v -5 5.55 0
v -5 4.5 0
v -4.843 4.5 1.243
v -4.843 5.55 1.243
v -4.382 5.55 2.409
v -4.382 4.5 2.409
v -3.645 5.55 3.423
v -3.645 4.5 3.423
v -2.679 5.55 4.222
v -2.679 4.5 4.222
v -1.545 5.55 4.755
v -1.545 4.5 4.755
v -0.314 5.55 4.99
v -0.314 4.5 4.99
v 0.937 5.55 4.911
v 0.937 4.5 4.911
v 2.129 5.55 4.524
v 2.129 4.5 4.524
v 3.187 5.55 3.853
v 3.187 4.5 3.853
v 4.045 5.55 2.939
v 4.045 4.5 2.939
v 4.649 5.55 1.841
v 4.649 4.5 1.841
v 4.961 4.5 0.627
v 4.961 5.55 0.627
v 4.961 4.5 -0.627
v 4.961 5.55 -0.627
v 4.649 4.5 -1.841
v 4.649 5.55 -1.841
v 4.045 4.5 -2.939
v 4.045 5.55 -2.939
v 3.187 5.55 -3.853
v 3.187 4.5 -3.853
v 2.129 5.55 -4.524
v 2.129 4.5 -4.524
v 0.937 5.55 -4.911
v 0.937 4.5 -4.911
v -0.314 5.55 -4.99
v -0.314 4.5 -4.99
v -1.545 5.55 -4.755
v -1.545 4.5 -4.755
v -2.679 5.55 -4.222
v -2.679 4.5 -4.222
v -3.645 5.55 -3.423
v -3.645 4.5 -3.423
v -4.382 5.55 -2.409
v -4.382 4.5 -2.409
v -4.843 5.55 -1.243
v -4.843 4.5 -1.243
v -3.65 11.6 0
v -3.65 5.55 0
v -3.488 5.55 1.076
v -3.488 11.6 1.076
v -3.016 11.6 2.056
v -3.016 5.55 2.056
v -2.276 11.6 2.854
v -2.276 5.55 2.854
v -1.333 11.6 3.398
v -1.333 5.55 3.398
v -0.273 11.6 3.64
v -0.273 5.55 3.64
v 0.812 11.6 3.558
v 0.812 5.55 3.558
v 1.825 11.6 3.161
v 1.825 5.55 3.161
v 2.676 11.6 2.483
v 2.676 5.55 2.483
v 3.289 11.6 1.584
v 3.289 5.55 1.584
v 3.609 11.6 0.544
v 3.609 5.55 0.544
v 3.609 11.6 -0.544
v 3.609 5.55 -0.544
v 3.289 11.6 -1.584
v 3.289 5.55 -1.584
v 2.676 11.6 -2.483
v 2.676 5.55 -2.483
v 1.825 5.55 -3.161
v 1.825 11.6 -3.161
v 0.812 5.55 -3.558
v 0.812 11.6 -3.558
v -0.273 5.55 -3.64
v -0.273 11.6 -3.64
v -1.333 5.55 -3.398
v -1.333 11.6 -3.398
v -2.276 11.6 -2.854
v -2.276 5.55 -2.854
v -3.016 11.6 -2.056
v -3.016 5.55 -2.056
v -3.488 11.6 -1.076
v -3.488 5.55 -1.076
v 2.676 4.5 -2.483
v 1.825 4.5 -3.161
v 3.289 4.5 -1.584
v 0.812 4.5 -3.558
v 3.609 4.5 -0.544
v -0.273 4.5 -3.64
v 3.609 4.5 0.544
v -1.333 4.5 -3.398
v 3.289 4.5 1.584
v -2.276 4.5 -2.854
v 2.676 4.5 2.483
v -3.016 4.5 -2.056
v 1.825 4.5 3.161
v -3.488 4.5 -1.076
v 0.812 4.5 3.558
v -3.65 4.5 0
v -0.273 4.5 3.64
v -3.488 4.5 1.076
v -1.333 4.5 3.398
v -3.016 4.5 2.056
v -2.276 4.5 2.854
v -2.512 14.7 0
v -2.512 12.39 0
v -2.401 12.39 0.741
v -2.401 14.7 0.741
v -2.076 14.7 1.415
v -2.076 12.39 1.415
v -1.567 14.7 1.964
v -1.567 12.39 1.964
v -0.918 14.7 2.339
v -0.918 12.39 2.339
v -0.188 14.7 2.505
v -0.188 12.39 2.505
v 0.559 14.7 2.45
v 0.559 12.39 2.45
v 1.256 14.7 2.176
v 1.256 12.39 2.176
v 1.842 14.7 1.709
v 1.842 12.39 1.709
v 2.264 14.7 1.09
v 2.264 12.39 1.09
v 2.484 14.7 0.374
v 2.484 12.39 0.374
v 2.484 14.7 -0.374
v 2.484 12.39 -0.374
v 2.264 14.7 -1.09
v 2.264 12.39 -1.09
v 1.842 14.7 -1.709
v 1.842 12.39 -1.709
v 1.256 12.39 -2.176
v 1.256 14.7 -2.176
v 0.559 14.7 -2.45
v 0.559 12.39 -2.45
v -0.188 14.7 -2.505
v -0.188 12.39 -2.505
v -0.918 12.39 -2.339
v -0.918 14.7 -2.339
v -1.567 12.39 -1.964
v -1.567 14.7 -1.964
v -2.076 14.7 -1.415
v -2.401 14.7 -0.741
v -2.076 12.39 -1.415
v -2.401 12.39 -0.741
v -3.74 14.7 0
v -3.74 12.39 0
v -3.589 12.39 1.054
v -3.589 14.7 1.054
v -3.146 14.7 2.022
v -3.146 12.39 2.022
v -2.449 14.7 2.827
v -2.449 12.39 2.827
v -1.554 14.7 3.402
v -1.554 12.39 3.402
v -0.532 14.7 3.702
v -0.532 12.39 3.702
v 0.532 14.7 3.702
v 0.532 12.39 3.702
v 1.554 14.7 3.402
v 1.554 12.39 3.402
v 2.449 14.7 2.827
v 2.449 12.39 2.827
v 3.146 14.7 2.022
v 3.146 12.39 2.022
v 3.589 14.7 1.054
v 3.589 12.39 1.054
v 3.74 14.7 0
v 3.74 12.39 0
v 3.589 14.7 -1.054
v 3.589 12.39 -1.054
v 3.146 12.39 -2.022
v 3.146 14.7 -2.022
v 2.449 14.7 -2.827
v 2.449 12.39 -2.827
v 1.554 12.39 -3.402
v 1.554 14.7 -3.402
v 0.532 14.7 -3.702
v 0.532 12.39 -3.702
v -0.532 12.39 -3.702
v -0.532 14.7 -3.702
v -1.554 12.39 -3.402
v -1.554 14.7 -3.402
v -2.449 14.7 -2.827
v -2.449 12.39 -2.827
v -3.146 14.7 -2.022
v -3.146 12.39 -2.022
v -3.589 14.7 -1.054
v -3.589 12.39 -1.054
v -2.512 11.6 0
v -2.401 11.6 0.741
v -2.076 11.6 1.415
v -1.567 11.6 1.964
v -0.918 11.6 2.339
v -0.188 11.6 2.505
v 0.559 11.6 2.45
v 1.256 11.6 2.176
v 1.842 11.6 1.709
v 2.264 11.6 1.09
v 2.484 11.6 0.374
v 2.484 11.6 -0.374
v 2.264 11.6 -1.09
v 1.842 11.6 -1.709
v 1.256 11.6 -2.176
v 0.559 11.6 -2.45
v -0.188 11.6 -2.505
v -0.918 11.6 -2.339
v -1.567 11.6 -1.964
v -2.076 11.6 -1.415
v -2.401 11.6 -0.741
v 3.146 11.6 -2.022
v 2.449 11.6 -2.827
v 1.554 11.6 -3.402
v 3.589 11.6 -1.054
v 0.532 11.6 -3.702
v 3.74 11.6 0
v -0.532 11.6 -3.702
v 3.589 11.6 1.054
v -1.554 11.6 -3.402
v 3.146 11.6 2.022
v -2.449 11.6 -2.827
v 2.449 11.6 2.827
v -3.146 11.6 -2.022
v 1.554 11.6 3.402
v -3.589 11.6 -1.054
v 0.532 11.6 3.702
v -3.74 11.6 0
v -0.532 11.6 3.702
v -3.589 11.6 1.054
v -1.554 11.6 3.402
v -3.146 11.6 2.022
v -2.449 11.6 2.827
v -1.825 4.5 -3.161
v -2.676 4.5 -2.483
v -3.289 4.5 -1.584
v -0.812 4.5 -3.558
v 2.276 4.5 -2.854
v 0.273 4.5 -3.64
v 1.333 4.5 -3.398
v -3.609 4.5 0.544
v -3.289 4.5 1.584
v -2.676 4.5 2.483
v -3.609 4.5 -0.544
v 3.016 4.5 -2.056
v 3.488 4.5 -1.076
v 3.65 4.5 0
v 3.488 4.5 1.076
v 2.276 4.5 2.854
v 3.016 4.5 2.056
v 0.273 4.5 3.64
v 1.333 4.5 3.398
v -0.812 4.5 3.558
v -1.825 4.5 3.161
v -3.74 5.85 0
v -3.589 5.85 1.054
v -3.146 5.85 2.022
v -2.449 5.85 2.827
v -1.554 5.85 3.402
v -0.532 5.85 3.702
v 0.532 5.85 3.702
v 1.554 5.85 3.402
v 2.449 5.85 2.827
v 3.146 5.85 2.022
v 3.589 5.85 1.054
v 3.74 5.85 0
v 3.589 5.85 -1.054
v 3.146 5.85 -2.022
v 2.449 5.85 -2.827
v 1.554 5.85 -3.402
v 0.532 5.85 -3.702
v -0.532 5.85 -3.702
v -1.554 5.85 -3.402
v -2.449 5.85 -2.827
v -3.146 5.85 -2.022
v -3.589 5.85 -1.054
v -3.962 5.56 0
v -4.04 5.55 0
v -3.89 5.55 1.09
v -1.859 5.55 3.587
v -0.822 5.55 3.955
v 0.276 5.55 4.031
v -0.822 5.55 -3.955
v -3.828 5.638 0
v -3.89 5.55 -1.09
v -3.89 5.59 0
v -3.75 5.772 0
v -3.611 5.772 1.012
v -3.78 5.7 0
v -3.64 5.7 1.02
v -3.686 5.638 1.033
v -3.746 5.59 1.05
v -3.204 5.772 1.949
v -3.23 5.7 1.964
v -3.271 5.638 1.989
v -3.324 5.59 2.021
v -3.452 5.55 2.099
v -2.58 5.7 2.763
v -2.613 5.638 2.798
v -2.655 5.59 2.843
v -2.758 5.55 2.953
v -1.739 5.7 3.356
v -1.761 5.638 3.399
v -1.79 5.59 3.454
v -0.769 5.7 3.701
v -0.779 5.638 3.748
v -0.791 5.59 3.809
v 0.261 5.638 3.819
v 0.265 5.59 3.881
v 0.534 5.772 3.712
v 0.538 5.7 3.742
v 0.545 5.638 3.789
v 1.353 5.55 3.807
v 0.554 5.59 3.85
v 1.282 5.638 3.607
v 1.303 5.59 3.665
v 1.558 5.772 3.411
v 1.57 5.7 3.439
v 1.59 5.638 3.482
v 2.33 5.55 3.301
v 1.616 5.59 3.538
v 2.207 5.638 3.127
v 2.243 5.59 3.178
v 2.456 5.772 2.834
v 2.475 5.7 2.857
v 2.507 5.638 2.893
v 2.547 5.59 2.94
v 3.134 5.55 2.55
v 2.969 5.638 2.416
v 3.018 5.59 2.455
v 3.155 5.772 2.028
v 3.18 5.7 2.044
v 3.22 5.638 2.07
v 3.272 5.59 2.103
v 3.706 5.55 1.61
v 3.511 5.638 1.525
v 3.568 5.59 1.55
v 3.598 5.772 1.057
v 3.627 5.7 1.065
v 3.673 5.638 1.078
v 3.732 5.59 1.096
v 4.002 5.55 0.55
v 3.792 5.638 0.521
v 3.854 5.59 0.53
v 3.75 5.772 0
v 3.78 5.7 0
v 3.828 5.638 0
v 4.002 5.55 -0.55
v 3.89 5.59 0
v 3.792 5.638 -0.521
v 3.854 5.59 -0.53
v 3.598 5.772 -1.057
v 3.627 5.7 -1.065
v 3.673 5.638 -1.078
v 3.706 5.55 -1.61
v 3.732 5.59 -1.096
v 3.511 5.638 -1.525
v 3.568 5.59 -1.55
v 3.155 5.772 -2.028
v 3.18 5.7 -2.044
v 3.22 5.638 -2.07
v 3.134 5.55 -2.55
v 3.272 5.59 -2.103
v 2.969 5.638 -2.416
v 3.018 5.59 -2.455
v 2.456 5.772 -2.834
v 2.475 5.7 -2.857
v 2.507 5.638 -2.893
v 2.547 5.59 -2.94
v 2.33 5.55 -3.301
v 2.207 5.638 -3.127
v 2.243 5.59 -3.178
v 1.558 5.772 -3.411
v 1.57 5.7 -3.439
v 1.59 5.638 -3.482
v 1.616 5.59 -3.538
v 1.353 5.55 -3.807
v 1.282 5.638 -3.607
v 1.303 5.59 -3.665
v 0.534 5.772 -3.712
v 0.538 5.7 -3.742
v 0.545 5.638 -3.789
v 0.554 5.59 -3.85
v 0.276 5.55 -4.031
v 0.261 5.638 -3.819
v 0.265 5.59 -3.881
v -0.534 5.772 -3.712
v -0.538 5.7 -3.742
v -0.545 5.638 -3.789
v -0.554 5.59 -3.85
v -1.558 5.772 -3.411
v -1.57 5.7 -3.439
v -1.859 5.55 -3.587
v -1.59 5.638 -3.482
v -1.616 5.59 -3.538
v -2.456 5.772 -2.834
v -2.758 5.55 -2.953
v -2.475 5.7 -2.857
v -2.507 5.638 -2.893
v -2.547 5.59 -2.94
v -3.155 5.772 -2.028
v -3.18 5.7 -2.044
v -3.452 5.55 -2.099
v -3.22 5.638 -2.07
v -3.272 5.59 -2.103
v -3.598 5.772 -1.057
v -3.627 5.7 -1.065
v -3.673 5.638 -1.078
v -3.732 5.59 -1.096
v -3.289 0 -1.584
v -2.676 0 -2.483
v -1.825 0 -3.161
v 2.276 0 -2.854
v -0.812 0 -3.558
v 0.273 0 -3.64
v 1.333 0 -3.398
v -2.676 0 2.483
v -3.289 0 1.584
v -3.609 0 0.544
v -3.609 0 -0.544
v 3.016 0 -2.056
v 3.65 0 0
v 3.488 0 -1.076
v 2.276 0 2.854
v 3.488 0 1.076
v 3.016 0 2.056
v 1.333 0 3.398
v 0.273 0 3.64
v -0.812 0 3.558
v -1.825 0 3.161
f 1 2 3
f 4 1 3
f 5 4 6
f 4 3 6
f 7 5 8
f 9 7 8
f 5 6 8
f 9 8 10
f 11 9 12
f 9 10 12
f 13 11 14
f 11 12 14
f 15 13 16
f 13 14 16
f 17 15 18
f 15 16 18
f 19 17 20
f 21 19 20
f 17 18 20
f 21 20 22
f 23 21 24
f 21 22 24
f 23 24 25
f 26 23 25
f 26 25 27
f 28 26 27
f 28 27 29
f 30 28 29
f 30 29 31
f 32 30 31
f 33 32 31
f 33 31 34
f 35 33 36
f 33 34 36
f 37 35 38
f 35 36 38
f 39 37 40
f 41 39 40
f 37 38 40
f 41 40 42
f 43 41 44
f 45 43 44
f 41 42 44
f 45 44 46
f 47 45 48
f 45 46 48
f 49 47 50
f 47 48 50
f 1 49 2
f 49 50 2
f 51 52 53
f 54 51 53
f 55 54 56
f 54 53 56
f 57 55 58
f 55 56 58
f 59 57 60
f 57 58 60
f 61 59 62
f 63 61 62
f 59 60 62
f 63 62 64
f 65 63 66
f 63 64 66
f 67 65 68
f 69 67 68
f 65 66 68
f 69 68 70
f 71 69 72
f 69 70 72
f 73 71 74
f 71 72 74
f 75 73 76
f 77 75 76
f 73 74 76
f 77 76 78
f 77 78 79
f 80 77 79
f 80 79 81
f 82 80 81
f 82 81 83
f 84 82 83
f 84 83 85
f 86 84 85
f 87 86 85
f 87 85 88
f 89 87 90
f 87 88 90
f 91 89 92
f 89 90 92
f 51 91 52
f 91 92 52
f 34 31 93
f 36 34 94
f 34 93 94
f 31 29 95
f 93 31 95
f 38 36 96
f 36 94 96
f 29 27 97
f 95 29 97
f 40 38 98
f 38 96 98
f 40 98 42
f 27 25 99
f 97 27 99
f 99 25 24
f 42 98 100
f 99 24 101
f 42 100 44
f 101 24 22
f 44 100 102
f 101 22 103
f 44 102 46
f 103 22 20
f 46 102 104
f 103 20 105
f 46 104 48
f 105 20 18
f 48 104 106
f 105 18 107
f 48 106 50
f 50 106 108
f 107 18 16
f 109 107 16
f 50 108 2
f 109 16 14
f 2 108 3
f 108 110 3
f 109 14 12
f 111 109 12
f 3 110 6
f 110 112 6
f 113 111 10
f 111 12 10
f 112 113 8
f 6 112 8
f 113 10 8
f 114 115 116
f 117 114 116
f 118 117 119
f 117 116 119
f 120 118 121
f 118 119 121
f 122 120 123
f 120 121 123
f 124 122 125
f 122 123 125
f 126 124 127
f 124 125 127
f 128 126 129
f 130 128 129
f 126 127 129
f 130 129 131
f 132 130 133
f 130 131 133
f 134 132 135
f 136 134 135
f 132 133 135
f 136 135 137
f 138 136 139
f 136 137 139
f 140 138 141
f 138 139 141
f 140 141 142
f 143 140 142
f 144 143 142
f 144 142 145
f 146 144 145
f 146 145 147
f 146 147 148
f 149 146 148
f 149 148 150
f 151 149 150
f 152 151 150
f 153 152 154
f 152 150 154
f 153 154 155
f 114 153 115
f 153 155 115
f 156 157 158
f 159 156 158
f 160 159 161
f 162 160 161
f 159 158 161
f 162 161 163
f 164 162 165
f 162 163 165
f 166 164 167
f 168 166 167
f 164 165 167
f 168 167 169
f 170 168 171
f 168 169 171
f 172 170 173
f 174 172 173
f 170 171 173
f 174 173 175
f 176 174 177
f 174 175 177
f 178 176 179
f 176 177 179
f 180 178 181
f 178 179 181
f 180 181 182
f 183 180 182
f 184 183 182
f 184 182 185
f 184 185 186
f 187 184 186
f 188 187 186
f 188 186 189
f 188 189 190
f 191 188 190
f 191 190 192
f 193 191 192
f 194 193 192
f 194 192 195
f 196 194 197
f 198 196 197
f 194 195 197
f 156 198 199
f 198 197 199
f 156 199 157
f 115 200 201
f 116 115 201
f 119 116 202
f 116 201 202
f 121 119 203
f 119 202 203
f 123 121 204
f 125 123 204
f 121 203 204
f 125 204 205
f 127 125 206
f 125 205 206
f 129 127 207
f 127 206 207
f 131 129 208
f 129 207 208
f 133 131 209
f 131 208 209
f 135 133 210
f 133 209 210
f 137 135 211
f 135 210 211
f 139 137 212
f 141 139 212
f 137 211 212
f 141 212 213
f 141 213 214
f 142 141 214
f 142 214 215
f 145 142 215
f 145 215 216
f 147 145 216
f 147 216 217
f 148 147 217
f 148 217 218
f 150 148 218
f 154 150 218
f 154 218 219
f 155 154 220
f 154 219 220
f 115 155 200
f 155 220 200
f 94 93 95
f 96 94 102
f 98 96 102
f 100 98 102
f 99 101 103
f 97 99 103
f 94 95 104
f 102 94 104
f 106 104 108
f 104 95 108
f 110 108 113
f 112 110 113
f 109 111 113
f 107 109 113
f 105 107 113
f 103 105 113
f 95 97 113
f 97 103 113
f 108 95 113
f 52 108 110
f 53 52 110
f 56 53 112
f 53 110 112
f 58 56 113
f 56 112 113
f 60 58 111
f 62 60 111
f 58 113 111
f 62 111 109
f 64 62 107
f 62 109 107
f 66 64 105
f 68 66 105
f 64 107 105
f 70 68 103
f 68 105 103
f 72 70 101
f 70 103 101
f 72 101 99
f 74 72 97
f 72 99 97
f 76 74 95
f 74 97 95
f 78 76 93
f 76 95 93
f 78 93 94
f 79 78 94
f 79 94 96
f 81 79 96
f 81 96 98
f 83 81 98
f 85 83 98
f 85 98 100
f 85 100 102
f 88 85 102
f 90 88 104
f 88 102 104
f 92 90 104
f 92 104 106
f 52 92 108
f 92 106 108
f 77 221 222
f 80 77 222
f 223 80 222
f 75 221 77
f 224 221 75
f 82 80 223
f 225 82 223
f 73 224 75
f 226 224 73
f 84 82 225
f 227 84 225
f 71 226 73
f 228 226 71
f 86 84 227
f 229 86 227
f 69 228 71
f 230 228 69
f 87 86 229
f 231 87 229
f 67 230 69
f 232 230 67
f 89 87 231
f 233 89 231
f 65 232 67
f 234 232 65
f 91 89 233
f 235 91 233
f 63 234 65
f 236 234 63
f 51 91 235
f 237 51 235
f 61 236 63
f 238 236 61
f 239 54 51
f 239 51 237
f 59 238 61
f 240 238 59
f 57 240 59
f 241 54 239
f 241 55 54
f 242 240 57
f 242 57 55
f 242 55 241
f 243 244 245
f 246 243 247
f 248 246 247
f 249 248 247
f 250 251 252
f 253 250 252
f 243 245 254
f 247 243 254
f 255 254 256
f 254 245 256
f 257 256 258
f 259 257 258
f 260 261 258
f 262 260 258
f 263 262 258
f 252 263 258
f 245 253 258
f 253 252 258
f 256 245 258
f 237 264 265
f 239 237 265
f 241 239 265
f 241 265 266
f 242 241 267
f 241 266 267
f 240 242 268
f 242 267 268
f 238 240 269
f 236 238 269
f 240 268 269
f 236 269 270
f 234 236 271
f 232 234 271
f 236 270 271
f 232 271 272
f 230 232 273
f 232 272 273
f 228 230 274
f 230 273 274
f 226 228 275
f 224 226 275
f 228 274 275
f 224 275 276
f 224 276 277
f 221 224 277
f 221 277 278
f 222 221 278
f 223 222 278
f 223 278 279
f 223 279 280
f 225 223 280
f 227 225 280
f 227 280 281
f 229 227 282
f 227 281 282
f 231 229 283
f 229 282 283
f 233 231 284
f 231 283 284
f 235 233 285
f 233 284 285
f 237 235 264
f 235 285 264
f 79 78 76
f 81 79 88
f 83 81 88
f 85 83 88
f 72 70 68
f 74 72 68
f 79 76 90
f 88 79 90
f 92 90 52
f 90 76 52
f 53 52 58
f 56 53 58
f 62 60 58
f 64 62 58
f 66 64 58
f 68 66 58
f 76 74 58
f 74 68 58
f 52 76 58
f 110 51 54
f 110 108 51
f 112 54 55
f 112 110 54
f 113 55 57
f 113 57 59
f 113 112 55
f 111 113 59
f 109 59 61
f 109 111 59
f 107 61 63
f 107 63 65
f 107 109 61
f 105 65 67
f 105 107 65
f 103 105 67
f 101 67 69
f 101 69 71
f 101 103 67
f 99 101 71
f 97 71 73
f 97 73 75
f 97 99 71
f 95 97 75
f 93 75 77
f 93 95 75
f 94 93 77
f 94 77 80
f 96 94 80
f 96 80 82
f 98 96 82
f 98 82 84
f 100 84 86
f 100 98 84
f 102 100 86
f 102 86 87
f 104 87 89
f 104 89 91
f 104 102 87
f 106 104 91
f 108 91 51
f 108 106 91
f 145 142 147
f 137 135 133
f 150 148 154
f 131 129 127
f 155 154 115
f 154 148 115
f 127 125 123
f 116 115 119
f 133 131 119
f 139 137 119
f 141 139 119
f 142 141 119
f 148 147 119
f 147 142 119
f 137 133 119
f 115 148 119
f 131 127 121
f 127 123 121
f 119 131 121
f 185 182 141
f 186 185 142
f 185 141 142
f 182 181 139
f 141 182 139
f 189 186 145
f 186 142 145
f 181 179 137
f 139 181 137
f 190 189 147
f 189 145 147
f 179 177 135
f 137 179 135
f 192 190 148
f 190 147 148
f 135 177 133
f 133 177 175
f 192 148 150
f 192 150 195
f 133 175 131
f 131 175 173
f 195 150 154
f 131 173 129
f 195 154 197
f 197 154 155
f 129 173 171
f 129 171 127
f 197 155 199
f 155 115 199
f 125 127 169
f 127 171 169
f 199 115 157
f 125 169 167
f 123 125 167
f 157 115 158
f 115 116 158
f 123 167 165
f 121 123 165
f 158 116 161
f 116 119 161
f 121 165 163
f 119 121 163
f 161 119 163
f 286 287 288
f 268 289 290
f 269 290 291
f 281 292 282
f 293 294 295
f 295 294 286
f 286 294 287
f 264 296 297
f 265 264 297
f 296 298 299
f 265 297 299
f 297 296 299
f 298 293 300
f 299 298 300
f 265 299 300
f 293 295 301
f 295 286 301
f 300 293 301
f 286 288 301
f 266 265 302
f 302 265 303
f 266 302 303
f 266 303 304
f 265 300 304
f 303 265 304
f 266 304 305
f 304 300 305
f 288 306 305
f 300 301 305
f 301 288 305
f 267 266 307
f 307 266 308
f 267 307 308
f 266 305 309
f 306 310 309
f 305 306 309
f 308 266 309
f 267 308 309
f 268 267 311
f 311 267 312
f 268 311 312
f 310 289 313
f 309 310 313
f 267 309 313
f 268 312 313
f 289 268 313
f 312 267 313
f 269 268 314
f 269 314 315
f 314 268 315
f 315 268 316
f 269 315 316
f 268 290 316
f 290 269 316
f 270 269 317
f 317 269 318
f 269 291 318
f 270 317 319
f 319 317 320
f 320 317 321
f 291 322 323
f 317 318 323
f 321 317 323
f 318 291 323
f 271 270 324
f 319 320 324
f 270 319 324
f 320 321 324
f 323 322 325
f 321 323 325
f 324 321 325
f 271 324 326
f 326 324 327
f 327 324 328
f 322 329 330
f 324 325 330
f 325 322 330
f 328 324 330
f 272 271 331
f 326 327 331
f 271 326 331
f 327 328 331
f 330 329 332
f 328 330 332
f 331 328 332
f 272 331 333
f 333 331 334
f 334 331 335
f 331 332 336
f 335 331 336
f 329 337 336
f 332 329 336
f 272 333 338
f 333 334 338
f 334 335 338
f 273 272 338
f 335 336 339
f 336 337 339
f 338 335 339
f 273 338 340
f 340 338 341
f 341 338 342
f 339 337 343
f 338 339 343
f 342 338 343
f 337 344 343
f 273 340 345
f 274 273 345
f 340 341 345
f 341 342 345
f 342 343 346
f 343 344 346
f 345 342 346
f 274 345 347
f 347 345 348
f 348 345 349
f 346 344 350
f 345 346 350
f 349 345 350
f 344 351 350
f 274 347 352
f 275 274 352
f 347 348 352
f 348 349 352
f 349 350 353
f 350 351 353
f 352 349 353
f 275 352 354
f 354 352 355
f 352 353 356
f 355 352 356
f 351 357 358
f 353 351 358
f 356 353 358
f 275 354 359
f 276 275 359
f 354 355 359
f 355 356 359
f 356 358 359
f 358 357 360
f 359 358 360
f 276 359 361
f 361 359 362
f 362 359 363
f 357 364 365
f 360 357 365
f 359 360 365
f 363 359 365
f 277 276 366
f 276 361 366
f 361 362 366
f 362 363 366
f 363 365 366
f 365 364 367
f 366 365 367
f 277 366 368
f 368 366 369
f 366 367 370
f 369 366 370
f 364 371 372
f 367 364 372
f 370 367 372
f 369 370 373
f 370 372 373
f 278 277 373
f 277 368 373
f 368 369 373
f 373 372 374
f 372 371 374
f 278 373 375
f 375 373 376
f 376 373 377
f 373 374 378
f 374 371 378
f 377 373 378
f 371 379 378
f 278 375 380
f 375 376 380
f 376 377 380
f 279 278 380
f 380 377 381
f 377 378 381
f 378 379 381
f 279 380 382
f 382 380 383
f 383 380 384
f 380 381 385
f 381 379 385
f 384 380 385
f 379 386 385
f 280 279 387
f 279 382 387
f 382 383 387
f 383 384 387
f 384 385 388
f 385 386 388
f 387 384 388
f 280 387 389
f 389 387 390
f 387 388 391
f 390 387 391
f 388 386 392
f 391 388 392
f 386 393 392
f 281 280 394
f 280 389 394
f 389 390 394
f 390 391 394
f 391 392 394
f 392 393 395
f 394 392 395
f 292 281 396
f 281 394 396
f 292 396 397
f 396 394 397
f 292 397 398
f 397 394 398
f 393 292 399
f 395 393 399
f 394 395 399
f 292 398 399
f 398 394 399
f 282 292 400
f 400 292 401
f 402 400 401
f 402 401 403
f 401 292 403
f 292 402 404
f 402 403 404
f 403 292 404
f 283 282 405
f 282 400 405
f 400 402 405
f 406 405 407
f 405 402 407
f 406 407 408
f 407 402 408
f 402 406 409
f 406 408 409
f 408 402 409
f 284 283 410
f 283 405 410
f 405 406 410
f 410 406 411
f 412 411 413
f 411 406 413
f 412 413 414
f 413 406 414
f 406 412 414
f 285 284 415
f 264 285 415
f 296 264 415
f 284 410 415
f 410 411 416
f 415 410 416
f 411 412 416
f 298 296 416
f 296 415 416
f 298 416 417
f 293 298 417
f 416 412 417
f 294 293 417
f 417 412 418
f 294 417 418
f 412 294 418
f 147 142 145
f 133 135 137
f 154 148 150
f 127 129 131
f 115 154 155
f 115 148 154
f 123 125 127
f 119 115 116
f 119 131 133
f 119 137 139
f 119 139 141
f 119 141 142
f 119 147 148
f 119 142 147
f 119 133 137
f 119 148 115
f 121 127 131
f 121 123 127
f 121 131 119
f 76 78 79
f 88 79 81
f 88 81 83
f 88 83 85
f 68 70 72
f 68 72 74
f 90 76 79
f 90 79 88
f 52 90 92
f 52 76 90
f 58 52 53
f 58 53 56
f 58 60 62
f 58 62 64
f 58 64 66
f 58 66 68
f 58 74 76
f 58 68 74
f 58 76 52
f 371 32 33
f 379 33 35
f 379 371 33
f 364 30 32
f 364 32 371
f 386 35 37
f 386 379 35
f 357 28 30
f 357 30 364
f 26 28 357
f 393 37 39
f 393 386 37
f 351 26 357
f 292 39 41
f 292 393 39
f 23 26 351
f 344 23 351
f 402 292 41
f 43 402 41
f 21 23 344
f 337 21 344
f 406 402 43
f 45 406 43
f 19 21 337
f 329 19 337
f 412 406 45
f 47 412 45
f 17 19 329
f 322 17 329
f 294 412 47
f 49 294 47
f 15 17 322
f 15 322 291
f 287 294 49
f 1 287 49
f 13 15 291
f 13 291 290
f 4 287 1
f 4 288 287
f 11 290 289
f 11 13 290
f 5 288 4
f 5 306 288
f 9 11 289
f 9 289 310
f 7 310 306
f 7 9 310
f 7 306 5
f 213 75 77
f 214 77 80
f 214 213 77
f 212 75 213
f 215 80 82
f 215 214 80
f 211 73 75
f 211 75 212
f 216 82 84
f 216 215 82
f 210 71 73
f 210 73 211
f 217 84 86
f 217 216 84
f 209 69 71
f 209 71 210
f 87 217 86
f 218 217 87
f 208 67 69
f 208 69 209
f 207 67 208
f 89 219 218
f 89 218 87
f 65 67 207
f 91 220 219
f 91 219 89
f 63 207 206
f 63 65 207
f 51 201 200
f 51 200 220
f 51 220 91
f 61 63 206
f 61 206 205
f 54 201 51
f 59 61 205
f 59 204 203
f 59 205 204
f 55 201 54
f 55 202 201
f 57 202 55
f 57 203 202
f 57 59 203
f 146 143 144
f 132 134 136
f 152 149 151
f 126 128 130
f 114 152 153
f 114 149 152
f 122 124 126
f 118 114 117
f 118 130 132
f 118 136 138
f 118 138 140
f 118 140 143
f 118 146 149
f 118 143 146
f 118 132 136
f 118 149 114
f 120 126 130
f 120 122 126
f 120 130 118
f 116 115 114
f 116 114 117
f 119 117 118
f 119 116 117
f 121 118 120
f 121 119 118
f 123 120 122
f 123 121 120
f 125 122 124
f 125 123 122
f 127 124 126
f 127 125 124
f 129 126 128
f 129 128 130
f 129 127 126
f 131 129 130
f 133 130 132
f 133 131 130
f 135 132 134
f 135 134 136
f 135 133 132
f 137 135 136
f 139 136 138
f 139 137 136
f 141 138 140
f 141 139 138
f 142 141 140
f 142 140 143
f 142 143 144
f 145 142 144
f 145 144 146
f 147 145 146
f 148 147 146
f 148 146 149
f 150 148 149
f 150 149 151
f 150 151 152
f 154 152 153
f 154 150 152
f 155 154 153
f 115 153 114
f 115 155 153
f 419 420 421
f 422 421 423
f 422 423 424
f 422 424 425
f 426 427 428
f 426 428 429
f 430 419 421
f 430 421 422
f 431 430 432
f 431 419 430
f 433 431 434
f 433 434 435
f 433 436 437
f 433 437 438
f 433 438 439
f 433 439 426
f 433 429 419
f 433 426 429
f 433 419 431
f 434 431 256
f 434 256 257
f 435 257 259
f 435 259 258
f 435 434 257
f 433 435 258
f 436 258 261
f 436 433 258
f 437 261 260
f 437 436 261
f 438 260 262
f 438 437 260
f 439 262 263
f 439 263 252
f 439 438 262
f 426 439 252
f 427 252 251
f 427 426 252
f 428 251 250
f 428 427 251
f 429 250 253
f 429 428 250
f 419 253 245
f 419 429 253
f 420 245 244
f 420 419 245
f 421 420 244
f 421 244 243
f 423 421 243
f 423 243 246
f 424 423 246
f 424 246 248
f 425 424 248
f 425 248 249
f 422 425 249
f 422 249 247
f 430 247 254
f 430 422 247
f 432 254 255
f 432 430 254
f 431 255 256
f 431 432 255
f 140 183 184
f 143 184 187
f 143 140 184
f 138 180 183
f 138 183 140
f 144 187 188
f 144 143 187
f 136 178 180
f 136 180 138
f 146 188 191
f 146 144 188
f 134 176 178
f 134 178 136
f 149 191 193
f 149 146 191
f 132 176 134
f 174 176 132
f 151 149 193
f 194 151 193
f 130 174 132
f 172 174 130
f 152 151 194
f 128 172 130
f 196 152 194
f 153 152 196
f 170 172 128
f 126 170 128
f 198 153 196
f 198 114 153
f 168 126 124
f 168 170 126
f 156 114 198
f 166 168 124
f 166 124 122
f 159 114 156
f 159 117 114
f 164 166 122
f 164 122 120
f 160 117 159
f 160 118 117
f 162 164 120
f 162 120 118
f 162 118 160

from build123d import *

# Parameters (mm, degrees)
F0_R      = 3.65
F1_DEPTH  = 4.5
F2_R      = 5
F2_R_2    = 3.65
F3_DEPTH  = 1.05
F4_R      = 3.65
F5_DEPTH  = 1.05
F6_R      = 3.74
F6_R_2    = 3.65
F7_DEPTH  = 6.05
F8_DEPTH  = 6.05
F9_R      = 2.5125
F10_DEPTH = 0.79
F11_R     = 3.74
F11_R_2   = 2.5125
F12_DEPTH = 2.31
F13_R     = 2.5125
F14_DEPTH = 2.31
F15_R     = 0.3


with BuildPart() as f1:
    # F0 (on Front) → F1 (new body)
    with BuildSketch(Plane.XZ):
        Circle(F0_R)
    extrude(amount=-F1_DEPTH)


with BuildPart() as f3:
    # F2 (on face) → F3 (new body)
    with BuildSketch(Plane(origin=(0, 4.5, 0), x_dir=(-1, 0, 0), z_dir=(0, 1, 0))):
        Circle(F2_R)
        Circle(F2_R_2, mode=Mode.SUBTRACT)
    extrude(amount=F3_DEPTH)

    # F6 (on face) → F7 (join)
    with BuildSketch(Plane(origin=(0, 5.55, 0), x_dir=(-1, 0, 0), z_dir=(0, 1, 0))):
        Circle(F6_R)
        Circle(F6_R_2, mode=Mode.SUBTRACT)
    extrude(amount=F7_DEPTH)

    # F15
    f15_edges = [f3.edges().sort_by_distance(p)[0] for p in [
        (3.74, 5.55, 0),
    ]]
    fillet(f15_edges, radius=F15_R)


with BuildPart() as f5:
    # F4 (on face) → F5 (new body)
    with BuildSketch(Plane(origin=(0, 4.5, 0), x_dir=(-1, 0, 0), z_dir=(0, 1, 0))):
        Circle(F4_R)
    extrude(amount=F5_DEPTH)


with BuildPart() as f8:
    # F8 (new): a face of the model
    f8_faces = [f5.part.faces().sort_by_distance(p)[0] for p in [
        (0, 5.55, 0),
    ]]
    extrude(f8_faces, amount=F8_DEPTH)

    # F9 (on face) → F10 (join)
    with BuildSketch(Plane(origin=(0, 11.6, 0), x_dir=(-1, 0, 0), z_dir=(0, 1, 0))):
        Circle(F9_R)
    extrude(amount=F10_DEPTH)


with BuildPart() as f12:
    # F11 (on face) → F12 (new body)
    with BuildSketch(Plane(origin=(0, 12.39, 0), x_dir=(-1, 0, 0), z_dir=(0, 1, 0))):
        Circle(F11_R)
        Circle(F11_R_2, mode=Mode.SUBTRACT)
    extrude(amount=F12_DEPTH)


with BuildPart() as f14:
    # F13 (on face) → F14 (new body)
    with BuildSketch(Plane(origin=(0, 12.39, 0), x_dir=(-1, 0, 0), z_dir=(0, 1, 0))):
        Circle(F13_R)
    extrude(amount=F14_DEPTH)


solid = Compound([f1.part, f3.part, f5.part, f8.part, f12.part, f14.part])
